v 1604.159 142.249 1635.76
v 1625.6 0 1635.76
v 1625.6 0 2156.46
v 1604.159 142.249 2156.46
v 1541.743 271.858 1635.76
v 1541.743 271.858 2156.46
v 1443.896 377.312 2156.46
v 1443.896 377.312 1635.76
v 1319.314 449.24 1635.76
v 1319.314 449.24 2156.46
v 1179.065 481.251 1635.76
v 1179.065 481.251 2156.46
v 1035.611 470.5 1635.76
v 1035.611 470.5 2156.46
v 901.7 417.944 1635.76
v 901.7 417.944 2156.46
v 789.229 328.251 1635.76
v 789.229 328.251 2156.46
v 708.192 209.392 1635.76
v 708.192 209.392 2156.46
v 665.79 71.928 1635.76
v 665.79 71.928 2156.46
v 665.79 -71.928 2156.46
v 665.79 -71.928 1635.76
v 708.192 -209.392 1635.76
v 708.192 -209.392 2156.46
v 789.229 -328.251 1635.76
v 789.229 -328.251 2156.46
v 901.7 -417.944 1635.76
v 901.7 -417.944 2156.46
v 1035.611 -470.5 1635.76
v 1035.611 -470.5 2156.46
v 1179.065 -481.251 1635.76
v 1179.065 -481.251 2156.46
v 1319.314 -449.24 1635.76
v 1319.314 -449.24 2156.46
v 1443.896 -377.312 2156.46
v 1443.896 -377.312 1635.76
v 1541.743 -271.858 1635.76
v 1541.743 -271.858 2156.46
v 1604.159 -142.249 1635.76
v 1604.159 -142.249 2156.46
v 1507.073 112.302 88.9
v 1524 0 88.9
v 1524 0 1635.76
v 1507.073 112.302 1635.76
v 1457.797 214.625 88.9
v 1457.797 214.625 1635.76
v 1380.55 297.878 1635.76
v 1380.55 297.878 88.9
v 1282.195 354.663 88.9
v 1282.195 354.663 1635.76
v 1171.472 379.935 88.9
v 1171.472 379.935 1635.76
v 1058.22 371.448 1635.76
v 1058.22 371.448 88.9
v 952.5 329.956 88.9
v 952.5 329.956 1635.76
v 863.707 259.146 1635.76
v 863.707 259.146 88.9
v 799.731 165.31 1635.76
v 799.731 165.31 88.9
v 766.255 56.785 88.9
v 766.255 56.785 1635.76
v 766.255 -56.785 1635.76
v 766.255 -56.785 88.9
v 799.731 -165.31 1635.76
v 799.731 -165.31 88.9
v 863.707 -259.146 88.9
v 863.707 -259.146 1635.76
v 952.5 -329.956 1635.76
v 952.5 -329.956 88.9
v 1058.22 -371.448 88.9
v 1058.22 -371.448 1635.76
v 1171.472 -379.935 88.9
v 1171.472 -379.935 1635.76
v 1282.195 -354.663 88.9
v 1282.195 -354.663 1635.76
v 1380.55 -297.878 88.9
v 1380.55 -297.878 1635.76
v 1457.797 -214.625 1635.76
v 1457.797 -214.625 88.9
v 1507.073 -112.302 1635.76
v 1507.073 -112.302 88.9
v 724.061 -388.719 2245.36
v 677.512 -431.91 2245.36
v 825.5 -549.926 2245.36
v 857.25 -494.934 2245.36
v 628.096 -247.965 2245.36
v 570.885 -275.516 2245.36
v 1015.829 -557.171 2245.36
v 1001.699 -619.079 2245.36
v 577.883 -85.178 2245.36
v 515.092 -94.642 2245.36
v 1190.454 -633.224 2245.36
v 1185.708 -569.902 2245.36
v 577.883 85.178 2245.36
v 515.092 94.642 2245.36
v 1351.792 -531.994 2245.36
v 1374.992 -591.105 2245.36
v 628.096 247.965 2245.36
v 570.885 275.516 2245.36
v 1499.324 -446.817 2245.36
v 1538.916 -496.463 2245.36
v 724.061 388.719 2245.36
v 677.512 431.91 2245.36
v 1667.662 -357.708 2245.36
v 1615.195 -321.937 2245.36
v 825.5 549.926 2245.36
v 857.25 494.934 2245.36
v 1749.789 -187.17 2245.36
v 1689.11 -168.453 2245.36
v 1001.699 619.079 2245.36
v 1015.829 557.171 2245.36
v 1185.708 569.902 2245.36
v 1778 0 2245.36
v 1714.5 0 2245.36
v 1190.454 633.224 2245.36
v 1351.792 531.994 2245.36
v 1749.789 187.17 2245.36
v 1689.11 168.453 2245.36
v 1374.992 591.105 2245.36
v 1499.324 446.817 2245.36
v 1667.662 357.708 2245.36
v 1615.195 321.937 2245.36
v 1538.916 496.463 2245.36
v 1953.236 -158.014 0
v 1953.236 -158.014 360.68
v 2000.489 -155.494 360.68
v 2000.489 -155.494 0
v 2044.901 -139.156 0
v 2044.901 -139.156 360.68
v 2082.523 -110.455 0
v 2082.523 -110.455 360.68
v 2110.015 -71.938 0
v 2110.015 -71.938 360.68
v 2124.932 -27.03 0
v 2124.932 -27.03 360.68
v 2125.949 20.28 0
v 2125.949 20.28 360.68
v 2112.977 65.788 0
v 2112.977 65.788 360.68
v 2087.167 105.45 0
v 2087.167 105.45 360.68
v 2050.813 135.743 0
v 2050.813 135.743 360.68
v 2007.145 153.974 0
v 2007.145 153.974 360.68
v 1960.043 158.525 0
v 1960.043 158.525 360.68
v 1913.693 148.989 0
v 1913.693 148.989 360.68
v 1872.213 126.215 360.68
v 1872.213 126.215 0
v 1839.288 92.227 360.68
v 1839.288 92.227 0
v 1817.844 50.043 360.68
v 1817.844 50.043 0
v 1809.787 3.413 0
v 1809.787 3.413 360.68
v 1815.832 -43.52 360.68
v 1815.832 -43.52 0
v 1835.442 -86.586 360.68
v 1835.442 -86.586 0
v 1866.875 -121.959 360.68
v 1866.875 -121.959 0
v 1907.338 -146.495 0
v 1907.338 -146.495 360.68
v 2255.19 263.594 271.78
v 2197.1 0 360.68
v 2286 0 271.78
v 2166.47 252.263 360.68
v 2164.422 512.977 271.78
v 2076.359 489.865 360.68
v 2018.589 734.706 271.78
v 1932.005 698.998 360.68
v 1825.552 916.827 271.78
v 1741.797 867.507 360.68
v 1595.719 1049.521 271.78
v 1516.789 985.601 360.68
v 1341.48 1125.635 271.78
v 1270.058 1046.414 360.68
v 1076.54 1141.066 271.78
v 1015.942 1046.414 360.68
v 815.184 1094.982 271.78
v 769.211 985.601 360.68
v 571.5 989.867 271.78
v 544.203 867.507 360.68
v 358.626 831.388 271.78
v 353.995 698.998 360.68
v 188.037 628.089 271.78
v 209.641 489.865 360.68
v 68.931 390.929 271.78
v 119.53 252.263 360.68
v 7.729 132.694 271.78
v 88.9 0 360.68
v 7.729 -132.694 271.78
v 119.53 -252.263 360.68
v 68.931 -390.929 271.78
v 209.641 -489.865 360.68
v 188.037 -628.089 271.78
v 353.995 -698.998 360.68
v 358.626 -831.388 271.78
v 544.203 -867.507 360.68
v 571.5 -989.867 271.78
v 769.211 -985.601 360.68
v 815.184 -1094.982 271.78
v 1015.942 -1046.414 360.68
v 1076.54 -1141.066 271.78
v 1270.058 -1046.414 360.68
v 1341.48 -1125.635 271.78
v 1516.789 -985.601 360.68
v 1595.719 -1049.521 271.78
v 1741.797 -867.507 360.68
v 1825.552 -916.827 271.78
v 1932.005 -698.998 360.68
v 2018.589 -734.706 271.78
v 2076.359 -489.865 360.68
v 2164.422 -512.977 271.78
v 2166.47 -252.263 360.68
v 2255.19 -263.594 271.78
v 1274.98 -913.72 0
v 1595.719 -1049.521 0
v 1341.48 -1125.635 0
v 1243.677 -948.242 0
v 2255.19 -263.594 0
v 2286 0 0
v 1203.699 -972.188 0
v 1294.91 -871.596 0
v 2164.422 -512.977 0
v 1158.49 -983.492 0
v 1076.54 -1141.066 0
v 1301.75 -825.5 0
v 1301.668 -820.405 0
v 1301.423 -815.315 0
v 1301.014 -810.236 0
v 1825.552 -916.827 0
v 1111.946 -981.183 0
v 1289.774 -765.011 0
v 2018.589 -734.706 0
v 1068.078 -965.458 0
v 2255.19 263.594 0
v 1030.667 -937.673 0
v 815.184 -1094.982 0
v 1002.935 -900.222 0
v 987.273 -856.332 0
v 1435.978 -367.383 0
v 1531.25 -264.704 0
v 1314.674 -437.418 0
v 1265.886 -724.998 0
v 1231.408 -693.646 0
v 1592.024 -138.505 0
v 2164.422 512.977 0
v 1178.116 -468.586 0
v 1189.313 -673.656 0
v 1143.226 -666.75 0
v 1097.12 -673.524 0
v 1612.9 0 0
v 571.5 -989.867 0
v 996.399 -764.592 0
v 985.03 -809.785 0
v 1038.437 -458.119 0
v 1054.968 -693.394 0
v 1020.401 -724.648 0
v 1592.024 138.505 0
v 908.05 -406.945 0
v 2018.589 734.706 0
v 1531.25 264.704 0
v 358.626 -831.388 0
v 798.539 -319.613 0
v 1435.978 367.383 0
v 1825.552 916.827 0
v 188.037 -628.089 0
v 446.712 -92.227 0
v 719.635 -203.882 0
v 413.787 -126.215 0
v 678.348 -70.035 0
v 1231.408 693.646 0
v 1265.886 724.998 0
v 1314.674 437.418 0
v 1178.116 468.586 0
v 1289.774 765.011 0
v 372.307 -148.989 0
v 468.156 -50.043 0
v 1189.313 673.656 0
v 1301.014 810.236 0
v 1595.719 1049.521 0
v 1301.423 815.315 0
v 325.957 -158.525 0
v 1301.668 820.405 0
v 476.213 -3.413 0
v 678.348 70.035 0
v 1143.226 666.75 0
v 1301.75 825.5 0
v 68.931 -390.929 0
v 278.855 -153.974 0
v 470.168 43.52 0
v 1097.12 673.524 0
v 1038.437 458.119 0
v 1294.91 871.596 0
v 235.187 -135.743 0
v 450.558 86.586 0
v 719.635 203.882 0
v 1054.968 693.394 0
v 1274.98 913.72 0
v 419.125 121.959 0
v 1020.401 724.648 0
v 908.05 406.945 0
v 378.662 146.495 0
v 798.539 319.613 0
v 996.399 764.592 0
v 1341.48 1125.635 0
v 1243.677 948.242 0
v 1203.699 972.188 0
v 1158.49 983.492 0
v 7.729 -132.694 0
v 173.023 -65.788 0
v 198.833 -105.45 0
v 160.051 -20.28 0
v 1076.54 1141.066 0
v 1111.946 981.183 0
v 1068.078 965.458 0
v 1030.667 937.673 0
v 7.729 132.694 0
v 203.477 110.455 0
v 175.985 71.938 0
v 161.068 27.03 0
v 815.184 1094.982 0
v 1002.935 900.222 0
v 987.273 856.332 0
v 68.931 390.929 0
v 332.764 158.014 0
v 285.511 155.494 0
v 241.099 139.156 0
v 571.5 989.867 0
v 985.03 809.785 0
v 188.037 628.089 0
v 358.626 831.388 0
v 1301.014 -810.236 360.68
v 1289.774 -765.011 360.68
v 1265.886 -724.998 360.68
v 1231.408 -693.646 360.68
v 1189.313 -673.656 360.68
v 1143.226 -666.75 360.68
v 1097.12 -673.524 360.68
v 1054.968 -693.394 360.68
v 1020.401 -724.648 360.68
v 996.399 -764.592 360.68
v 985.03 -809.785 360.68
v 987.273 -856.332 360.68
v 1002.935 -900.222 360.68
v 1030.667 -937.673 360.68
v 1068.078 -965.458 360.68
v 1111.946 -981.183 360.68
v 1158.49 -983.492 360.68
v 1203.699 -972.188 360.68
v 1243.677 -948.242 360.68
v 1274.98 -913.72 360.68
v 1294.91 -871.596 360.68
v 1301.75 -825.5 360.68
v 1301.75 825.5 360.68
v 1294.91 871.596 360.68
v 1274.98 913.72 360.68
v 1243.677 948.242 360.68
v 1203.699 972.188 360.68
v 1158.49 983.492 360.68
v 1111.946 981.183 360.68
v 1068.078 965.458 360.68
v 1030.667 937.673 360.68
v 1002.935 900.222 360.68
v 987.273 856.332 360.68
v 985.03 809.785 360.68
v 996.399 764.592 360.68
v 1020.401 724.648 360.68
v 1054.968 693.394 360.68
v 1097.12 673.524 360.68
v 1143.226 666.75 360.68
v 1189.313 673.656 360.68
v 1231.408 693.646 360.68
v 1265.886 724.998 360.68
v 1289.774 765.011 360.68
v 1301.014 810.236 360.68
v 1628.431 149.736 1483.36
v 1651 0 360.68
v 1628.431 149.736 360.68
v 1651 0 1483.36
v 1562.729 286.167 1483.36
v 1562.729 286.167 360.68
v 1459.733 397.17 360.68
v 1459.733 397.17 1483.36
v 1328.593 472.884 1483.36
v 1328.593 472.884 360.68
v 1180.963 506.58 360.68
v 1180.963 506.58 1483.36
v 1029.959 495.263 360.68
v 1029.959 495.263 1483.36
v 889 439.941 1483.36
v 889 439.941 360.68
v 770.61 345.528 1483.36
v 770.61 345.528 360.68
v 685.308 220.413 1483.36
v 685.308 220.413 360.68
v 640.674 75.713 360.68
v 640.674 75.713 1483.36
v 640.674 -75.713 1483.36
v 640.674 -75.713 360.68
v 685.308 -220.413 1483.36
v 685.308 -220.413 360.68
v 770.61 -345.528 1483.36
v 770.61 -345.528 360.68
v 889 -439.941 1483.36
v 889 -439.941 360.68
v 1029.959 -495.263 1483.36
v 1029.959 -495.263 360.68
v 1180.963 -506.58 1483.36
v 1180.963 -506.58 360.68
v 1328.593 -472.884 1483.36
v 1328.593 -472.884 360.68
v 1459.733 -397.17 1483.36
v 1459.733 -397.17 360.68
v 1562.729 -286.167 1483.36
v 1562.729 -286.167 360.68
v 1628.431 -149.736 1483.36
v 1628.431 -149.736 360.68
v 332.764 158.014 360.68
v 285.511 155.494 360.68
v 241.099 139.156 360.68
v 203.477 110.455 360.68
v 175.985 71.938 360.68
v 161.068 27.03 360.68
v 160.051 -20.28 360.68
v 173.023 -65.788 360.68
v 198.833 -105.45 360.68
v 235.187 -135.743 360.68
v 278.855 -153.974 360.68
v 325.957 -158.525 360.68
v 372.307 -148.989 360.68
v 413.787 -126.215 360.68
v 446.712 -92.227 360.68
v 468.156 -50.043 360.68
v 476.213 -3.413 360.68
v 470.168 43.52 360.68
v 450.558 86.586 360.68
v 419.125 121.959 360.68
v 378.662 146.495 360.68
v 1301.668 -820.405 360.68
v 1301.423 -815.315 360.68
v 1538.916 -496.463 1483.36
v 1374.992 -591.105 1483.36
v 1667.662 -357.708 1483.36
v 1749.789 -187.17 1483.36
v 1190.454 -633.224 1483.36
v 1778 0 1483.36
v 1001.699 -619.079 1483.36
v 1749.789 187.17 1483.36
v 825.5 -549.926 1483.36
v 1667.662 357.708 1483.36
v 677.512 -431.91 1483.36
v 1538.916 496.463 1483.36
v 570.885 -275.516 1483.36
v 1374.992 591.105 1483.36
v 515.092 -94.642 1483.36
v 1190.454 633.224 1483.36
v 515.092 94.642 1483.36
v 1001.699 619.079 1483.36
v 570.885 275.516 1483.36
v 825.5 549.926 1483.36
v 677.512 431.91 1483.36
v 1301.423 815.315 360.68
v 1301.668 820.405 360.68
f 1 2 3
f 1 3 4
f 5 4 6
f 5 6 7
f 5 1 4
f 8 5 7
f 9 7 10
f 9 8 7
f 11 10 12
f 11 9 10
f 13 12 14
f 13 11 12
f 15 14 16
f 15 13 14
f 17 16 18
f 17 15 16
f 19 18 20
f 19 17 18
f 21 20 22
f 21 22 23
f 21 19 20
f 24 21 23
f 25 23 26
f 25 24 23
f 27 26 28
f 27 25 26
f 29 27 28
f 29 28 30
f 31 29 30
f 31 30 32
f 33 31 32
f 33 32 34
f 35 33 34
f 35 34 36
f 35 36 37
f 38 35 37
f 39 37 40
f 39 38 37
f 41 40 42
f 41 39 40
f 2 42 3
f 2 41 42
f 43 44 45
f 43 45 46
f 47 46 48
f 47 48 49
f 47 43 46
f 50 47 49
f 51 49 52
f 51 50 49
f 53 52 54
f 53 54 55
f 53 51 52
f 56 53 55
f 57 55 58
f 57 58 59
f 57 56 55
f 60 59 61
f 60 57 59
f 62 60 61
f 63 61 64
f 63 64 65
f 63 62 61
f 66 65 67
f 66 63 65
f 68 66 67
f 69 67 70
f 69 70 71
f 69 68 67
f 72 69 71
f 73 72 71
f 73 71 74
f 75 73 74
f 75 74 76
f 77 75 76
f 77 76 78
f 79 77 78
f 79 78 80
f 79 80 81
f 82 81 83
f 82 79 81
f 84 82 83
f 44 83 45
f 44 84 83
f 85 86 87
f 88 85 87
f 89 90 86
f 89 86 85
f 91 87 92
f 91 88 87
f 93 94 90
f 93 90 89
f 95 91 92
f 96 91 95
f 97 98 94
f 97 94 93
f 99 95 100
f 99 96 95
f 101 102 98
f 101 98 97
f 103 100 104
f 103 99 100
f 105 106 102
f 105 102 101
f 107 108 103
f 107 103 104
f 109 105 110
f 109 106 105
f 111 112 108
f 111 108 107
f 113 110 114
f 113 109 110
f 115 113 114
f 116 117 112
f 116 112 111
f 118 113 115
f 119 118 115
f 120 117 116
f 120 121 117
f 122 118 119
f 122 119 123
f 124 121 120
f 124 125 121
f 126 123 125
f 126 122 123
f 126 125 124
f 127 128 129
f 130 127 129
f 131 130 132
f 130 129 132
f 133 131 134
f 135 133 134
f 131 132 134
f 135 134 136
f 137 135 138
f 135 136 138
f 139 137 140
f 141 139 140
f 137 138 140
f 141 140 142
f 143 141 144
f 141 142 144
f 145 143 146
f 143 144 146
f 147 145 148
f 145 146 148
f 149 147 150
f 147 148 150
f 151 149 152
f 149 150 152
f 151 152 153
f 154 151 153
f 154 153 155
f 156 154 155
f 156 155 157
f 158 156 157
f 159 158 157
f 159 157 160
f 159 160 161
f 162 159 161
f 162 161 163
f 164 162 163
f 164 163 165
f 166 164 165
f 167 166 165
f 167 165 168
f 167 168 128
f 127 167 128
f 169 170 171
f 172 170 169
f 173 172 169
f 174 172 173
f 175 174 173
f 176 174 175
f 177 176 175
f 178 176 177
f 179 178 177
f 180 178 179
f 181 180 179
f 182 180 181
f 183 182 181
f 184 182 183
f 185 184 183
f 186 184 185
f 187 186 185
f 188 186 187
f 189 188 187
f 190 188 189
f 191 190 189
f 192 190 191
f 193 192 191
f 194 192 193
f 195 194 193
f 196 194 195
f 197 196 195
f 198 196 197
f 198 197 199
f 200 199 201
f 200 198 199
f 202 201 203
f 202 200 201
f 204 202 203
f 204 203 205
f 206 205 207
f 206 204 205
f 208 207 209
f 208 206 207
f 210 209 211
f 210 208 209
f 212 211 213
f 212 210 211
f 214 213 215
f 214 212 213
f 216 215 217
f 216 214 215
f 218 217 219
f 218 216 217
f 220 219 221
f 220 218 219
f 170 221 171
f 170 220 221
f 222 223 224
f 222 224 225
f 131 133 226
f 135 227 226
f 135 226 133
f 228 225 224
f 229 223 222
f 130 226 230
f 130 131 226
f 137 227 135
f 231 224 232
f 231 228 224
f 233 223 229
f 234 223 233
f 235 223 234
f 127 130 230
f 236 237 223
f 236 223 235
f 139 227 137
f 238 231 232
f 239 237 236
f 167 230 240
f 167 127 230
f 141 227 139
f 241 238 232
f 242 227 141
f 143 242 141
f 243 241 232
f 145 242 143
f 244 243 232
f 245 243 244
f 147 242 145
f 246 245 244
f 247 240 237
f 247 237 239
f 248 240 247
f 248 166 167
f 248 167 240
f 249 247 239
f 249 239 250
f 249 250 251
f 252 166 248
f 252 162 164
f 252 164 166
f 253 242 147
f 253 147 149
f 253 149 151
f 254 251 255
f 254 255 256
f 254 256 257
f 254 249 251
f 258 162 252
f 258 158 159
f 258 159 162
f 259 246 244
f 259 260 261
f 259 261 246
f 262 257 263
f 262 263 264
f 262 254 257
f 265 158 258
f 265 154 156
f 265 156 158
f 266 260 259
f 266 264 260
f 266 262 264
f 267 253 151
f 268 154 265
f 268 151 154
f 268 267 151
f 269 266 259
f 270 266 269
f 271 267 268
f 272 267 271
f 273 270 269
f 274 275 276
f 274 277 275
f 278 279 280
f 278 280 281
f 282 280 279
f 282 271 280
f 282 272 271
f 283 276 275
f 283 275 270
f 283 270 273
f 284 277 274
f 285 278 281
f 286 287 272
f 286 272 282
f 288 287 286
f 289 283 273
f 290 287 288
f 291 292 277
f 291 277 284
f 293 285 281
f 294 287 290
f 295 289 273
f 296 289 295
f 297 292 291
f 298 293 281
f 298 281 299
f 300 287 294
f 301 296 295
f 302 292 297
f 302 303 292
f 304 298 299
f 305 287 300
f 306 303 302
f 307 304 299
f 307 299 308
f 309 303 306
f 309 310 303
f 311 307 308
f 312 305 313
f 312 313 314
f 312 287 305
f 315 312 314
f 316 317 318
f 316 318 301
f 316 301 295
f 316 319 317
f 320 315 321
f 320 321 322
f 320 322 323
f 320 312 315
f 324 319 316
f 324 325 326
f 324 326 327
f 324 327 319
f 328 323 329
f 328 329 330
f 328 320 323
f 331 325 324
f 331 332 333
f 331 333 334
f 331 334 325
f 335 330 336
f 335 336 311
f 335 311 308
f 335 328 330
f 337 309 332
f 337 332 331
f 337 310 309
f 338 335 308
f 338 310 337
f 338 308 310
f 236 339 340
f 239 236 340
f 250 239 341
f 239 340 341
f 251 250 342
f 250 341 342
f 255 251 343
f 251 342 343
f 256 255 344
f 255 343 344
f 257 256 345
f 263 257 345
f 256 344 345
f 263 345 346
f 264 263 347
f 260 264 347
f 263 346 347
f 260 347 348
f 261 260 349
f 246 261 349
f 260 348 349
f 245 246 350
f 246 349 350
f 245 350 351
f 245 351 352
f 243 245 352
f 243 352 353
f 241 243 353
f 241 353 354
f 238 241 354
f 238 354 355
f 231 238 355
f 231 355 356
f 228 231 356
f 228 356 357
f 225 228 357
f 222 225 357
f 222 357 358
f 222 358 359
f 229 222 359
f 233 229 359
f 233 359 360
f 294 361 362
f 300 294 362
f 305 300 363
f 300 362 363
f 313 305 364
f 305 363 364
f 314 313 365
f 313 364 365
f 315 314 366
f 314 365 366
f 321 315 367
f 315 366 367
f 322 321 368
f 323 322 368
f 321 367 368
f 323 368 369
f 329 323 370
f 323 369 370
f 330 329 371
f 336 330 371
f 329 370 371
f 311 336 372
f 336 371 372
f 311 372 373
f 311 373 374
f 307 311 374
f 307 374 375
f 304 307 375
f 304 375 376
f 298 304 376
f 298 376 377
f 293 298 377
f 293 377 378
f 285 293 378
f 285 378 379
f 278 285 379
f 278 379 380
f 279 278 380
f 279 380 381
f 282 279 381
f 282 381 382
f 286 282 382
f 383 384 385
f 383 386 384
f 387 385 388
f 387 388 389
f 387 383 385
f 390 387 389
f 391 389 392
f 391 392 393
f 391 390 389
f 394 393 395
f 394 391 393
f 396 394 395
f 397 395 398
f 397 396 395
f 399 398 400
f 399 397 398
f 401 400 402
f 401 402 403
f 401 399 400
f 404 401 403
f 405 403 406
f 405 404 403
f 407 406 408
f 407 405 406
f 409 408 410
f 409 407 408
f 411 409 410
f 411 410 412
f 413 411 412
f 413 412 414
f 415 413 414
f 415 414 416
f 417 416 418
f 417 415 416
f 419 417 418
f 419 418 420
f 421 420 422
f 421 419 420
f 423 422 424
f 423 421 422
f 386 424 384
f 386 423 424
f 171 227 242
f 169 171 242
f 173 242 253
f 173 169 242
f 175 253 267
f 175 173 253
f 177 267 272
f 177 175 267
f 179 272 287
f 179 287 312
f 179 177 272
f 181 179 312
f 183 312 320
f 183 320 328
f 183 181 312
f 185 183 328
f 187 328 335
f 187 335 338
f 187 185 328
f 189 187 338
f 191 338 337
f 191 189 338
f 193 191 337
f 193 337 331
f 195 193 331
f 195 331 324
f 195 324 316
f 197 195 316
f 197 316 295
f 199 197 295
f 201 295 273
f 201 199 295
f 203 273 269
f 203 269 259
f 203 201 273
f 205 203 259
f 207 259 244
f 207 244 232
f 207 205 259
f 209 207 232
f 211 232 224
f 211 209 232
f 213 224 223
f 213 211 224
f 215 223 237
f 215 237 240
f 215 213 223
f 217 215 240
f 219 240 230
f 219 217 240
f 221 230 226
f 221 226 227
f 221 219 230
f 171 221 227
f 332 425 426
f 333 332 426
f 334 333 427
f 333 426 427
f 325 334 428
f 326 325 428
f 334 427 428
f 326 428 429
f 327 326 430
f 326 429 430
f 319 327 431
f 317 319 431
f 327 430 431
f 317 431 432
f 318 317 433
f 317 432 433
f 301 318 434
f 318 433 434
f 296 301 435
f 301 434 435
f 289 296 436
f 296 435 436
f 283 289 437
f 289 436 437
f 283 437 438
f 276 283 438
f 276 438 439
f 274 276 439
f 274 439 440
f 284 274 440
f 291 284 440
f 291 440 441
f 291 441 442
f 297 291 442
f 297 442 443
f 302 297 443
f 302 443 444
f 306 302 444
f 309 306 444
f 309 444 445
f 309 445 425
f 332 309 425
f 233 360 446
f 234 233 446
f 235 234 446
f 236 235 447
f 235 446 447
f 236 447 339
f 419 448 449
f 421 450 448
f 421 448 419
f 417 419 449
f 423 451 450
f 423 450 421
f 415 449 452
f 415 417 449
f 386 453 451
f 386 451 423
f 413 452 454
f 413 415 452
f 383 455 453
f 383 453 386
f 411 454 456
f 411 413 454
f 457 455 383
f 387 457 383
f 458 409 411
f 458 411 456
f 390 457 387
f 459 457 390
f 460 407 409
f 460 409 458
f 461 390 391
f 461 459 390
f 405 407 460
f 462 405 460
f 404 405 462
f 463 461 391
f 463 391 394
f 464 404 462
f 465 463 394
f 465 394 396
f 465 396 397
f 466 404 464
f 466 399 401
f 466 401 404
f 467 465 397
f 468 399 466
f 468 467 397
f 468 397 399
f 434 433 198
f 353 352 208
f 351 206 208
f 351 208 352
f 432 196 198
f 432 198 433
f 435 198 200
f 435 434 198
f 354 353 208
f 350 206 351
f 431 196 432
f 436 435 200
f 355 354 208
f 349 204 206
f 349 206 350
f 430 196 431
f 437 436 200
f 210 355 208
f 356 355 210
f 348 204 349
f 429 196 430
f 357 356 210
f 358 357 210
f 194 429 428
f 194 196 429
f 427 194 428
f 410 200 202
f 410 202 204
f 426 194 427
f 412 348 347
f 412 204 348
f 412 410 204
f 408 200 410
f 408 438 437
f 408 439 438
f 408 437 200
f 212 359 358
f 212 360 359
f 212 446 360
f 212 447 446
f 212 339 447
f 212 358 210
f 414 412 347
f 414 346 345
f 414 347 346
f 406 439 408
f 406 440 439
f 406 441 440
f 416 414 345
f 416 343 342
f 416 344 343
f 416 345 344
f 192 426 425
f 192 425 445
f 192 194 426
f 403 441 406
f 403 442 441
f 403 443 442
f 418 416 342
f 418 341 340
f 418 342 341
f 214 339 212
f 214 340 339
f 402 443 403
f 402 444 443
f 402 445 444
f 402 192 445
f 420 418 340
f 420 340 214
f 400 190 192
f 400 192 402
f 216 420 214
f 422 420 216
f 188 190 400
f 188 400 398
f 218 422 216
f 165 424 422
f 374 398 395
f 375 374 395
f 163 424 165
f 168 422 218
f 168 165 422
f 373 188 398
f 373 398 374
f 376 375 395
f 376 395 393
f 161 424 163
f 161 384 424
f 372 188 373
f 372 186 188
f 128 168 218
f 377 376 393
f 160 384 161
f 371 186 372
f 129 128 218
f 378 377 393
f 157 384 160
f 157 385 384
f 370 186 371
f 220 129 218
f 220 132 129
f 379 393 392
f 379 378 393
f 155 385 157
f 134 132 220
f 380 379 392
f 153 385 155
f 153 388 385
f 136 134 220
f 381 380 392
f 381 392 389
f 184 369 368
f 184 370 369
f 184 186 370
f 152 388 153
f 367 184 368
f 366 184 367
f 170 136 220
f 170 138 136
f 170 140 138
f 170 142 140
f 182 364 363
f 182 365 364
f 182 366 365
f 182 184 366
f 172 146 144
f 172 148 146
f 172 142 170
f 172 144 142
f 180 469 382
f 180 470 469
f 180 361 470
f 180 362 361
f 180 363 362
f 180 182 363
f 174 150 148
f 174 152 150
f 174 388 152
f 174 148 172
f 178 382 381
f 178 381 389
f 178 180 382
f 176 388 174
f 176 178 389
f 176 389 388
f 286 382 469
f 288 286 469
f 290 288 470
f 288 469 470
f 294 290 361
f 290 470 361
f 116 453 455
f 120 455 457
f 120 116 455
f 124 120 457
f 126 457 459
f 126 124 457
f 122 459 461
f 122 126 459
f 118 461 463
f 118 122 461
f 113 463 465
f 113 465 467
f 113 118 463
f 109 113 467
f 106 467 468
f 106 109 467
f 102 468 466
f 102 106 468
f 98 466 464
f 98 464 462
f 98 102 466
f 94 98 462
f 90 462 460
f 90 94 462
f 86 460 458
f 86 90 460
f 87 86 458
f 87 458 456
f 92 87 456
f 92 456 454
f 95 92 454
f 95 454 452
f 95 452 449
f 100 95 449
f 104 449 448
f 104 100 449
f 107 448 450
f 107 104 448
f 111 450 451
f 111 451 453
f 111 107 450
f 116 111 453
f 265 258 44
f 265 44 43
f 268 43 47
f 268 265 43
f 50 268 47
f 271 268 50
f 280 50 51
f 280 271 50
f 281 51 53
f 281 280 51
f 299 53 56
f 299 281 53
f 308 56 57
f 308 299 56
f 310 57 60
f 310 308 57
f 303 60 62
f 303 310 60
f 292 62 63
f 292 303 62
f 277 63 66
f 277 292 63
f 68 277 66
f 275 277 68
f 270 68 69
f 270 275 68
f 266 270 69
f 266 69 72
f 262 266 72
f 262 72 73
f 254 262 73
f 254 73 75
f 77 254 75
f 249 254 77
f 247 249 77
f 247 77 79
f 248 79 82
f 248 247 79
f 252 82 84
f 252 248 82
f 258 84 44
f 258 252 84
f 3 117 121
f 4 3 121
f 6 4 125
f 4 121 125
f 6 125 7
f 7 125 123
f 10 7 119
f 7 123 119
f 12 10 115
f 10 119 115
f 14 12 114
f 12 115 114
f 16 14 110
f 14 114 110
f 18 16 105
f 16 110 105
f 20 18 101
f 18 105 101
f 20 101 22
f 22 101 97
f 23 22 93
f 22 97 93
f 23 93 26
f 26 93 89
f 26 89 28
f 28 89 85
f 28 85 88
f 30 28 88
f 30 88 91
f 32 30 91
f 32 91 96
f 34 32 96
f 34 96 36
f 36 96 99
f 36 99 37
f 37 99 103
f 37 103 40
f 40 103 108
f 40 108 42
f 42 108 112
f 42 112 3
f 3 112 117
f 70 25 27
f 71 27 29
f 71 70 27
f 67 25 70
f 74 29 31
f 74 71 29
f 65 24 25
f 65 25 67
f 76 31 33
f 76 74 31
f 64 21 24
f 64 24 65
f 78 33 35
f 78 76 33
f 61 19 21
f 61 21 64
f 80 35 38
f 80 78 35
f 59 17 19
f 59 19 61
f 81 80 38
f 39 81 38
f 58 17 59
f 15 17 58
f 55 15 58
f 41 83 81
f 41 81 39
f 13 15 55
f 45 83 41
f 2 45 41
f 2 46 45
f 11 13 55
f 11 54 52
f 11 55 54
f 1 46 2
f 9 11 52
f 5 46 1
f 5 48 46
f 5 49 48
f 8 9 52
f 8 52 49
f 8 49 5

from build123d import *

# Parameters (mm, degrees)
F2_SIZE  = 88.9
F3_SIZE  = 88.9
F4_SIZE  = 88.9
F6_DEPTH = 360.681


with BuildPart() as f1:
    # F0 (on Front) → F1 (revolve)
    with BuildSketch(Plane.XZ):
        Polygon((1524, 1635.76), (1524, 0), (2286, 0), (2286, 360.68), (1651, 360.68), (1651, 1483.36), (1778, 1483.36), (1778, 2245.36), (1625.6, 2245.36), (1625.6, 1635.76), align=None)
    revolve(axis=Axis((1143, 0, 1563.8531446457), (0, 0, 1)))

    # F2
    f2_edges = [f1.edges().sort_by_distance(p)[0] for p in [
        (762, 0, 0),
    ]]
    chamfer(f2_edges, length=F2_SIZE)

    # F3
    f3_edges = [f1.edges().sort_by_distance(p)[0] for p in [
        (0, 0, 360.68),
    ]]
    chamfer(f3_edges, length=F3_SIZE)

    # F4
    f4_edges = [f1.edges().sort_by_distance(p)[0] for p in [
        (660.4, 0, 2245.36),
    ]]
    chamfer(f4_edges, length=F4_SIZE)

    # F5 (on face) → F6 (cut, through all)
    with BuildSketch(Plane.XY.offset(360.68)):
        with BuildLine():
            ThreePointArc((984.9855706331, 810.2355769231), (1143, 825.5), (1301.0144293669, 810.2355769231))
            ThreePointArc((1301.0144293668, 810.2355769231), (1301.5660007095, 817.8589320768), (1301.75, 825.5))
            ThreePointArc((1301.75, 825.5), (1135.3589320768, 984.0660007095), (984.9855706332, 810.2355769231))
        make_face()
        with BuildLine():
            ThreePointArc((984.9855706332, 810.2355769231), (1143, 666.75), (1301.0144293668, 810.2355769231))
            ThreePointArc((1301.0144293669, 810.2355769231), (1143, 825.5), (984.9855706331, 810.2355769231))
        make_face()
        with BuildLine():
            ThreePointArc((1953.2355769231, -158.0144293668), (1964.6750327076, -79.375), (1968.5, 0))
            ThreePointArc((1968.5, 0), (1964.6750327076, 79.375), (1953.2355769231, 158.0144293668))
            ThreePointArc((1953.2355769231, 158.0144293668), (1809.75, 0), (1953.2355769231, -158.0144293668))
        make_face()
        with BuildLine():
            ThreePointArc((1953.2355769231, 158.0144293668), (1964.6750327076, 79.375), (1968.5, 0))
            ThreePointArc((1968.5, 0), (1964.6750327076, -79.375), (1953.2355769231, -158.0144293668))
            ThreePointArc((1953.2355769231, -158.0144293668), (2075.2200434233, -117.5261453113), (2127.25, 0))
            ThreePointArc((2127.25, 0), (2075.2200434233, 117.5261453113), (1953.2355769231, 158.0144293668))
        make_face()
        with BuildLine():
            ThreePointArc((984.9855706331, -810.2355769231), (1143, -825.5), (1301.0144293669, -810.2355769231))
            ThreePointArc((1301.0144293668, -810.2355769231), (1143, -666.75), (984.9855706332, -810.2355769231))
        make_face()
        with BuildLine():
            ThreePointArc((1301.75, -825.5), (1301.5660007095, -817.8589320768), (1301.0144293668, -810.2355769231))
            ThreePointArc((1301.0144293669, -810.2355769231), (1143, -825.5), (984.9855706331, -810.2355769231))
            ThreePointArc((984.9855706332, -810.2355769231), (1135.3589320768, -984.0660007095), (1301.75, -825.5))
        make_face()
        with BuildLine():
            ThreePointArc((476.25, 0), (435.0261453113, 106.7200434233), (332.7644230769, 158.0144293668))
            ThreePointArc((332.7644230769, 158.0144293668), (317.5, 0), (332.7644230769, -158.0144293668))
            ThreePointArc((332.7644230769, -158.0144293668), (435.0261453113, -106.7200434233), (476.25, 0))
        make_face()
        with BuildLine():
            ThreePointArc((332.7644230769, -158.0144293668), (317.5, 0), (332.7644230769, 158.0144293668))
            ThreePointArc((332.7644230769, 158.0144293668), (158.75, 0), (332.7644230769, -158.0144293668))
        make_face()
    extrude(amount=-F6_DEPTH, mode=Mode.SUBTRACT)


solid = f1.part
